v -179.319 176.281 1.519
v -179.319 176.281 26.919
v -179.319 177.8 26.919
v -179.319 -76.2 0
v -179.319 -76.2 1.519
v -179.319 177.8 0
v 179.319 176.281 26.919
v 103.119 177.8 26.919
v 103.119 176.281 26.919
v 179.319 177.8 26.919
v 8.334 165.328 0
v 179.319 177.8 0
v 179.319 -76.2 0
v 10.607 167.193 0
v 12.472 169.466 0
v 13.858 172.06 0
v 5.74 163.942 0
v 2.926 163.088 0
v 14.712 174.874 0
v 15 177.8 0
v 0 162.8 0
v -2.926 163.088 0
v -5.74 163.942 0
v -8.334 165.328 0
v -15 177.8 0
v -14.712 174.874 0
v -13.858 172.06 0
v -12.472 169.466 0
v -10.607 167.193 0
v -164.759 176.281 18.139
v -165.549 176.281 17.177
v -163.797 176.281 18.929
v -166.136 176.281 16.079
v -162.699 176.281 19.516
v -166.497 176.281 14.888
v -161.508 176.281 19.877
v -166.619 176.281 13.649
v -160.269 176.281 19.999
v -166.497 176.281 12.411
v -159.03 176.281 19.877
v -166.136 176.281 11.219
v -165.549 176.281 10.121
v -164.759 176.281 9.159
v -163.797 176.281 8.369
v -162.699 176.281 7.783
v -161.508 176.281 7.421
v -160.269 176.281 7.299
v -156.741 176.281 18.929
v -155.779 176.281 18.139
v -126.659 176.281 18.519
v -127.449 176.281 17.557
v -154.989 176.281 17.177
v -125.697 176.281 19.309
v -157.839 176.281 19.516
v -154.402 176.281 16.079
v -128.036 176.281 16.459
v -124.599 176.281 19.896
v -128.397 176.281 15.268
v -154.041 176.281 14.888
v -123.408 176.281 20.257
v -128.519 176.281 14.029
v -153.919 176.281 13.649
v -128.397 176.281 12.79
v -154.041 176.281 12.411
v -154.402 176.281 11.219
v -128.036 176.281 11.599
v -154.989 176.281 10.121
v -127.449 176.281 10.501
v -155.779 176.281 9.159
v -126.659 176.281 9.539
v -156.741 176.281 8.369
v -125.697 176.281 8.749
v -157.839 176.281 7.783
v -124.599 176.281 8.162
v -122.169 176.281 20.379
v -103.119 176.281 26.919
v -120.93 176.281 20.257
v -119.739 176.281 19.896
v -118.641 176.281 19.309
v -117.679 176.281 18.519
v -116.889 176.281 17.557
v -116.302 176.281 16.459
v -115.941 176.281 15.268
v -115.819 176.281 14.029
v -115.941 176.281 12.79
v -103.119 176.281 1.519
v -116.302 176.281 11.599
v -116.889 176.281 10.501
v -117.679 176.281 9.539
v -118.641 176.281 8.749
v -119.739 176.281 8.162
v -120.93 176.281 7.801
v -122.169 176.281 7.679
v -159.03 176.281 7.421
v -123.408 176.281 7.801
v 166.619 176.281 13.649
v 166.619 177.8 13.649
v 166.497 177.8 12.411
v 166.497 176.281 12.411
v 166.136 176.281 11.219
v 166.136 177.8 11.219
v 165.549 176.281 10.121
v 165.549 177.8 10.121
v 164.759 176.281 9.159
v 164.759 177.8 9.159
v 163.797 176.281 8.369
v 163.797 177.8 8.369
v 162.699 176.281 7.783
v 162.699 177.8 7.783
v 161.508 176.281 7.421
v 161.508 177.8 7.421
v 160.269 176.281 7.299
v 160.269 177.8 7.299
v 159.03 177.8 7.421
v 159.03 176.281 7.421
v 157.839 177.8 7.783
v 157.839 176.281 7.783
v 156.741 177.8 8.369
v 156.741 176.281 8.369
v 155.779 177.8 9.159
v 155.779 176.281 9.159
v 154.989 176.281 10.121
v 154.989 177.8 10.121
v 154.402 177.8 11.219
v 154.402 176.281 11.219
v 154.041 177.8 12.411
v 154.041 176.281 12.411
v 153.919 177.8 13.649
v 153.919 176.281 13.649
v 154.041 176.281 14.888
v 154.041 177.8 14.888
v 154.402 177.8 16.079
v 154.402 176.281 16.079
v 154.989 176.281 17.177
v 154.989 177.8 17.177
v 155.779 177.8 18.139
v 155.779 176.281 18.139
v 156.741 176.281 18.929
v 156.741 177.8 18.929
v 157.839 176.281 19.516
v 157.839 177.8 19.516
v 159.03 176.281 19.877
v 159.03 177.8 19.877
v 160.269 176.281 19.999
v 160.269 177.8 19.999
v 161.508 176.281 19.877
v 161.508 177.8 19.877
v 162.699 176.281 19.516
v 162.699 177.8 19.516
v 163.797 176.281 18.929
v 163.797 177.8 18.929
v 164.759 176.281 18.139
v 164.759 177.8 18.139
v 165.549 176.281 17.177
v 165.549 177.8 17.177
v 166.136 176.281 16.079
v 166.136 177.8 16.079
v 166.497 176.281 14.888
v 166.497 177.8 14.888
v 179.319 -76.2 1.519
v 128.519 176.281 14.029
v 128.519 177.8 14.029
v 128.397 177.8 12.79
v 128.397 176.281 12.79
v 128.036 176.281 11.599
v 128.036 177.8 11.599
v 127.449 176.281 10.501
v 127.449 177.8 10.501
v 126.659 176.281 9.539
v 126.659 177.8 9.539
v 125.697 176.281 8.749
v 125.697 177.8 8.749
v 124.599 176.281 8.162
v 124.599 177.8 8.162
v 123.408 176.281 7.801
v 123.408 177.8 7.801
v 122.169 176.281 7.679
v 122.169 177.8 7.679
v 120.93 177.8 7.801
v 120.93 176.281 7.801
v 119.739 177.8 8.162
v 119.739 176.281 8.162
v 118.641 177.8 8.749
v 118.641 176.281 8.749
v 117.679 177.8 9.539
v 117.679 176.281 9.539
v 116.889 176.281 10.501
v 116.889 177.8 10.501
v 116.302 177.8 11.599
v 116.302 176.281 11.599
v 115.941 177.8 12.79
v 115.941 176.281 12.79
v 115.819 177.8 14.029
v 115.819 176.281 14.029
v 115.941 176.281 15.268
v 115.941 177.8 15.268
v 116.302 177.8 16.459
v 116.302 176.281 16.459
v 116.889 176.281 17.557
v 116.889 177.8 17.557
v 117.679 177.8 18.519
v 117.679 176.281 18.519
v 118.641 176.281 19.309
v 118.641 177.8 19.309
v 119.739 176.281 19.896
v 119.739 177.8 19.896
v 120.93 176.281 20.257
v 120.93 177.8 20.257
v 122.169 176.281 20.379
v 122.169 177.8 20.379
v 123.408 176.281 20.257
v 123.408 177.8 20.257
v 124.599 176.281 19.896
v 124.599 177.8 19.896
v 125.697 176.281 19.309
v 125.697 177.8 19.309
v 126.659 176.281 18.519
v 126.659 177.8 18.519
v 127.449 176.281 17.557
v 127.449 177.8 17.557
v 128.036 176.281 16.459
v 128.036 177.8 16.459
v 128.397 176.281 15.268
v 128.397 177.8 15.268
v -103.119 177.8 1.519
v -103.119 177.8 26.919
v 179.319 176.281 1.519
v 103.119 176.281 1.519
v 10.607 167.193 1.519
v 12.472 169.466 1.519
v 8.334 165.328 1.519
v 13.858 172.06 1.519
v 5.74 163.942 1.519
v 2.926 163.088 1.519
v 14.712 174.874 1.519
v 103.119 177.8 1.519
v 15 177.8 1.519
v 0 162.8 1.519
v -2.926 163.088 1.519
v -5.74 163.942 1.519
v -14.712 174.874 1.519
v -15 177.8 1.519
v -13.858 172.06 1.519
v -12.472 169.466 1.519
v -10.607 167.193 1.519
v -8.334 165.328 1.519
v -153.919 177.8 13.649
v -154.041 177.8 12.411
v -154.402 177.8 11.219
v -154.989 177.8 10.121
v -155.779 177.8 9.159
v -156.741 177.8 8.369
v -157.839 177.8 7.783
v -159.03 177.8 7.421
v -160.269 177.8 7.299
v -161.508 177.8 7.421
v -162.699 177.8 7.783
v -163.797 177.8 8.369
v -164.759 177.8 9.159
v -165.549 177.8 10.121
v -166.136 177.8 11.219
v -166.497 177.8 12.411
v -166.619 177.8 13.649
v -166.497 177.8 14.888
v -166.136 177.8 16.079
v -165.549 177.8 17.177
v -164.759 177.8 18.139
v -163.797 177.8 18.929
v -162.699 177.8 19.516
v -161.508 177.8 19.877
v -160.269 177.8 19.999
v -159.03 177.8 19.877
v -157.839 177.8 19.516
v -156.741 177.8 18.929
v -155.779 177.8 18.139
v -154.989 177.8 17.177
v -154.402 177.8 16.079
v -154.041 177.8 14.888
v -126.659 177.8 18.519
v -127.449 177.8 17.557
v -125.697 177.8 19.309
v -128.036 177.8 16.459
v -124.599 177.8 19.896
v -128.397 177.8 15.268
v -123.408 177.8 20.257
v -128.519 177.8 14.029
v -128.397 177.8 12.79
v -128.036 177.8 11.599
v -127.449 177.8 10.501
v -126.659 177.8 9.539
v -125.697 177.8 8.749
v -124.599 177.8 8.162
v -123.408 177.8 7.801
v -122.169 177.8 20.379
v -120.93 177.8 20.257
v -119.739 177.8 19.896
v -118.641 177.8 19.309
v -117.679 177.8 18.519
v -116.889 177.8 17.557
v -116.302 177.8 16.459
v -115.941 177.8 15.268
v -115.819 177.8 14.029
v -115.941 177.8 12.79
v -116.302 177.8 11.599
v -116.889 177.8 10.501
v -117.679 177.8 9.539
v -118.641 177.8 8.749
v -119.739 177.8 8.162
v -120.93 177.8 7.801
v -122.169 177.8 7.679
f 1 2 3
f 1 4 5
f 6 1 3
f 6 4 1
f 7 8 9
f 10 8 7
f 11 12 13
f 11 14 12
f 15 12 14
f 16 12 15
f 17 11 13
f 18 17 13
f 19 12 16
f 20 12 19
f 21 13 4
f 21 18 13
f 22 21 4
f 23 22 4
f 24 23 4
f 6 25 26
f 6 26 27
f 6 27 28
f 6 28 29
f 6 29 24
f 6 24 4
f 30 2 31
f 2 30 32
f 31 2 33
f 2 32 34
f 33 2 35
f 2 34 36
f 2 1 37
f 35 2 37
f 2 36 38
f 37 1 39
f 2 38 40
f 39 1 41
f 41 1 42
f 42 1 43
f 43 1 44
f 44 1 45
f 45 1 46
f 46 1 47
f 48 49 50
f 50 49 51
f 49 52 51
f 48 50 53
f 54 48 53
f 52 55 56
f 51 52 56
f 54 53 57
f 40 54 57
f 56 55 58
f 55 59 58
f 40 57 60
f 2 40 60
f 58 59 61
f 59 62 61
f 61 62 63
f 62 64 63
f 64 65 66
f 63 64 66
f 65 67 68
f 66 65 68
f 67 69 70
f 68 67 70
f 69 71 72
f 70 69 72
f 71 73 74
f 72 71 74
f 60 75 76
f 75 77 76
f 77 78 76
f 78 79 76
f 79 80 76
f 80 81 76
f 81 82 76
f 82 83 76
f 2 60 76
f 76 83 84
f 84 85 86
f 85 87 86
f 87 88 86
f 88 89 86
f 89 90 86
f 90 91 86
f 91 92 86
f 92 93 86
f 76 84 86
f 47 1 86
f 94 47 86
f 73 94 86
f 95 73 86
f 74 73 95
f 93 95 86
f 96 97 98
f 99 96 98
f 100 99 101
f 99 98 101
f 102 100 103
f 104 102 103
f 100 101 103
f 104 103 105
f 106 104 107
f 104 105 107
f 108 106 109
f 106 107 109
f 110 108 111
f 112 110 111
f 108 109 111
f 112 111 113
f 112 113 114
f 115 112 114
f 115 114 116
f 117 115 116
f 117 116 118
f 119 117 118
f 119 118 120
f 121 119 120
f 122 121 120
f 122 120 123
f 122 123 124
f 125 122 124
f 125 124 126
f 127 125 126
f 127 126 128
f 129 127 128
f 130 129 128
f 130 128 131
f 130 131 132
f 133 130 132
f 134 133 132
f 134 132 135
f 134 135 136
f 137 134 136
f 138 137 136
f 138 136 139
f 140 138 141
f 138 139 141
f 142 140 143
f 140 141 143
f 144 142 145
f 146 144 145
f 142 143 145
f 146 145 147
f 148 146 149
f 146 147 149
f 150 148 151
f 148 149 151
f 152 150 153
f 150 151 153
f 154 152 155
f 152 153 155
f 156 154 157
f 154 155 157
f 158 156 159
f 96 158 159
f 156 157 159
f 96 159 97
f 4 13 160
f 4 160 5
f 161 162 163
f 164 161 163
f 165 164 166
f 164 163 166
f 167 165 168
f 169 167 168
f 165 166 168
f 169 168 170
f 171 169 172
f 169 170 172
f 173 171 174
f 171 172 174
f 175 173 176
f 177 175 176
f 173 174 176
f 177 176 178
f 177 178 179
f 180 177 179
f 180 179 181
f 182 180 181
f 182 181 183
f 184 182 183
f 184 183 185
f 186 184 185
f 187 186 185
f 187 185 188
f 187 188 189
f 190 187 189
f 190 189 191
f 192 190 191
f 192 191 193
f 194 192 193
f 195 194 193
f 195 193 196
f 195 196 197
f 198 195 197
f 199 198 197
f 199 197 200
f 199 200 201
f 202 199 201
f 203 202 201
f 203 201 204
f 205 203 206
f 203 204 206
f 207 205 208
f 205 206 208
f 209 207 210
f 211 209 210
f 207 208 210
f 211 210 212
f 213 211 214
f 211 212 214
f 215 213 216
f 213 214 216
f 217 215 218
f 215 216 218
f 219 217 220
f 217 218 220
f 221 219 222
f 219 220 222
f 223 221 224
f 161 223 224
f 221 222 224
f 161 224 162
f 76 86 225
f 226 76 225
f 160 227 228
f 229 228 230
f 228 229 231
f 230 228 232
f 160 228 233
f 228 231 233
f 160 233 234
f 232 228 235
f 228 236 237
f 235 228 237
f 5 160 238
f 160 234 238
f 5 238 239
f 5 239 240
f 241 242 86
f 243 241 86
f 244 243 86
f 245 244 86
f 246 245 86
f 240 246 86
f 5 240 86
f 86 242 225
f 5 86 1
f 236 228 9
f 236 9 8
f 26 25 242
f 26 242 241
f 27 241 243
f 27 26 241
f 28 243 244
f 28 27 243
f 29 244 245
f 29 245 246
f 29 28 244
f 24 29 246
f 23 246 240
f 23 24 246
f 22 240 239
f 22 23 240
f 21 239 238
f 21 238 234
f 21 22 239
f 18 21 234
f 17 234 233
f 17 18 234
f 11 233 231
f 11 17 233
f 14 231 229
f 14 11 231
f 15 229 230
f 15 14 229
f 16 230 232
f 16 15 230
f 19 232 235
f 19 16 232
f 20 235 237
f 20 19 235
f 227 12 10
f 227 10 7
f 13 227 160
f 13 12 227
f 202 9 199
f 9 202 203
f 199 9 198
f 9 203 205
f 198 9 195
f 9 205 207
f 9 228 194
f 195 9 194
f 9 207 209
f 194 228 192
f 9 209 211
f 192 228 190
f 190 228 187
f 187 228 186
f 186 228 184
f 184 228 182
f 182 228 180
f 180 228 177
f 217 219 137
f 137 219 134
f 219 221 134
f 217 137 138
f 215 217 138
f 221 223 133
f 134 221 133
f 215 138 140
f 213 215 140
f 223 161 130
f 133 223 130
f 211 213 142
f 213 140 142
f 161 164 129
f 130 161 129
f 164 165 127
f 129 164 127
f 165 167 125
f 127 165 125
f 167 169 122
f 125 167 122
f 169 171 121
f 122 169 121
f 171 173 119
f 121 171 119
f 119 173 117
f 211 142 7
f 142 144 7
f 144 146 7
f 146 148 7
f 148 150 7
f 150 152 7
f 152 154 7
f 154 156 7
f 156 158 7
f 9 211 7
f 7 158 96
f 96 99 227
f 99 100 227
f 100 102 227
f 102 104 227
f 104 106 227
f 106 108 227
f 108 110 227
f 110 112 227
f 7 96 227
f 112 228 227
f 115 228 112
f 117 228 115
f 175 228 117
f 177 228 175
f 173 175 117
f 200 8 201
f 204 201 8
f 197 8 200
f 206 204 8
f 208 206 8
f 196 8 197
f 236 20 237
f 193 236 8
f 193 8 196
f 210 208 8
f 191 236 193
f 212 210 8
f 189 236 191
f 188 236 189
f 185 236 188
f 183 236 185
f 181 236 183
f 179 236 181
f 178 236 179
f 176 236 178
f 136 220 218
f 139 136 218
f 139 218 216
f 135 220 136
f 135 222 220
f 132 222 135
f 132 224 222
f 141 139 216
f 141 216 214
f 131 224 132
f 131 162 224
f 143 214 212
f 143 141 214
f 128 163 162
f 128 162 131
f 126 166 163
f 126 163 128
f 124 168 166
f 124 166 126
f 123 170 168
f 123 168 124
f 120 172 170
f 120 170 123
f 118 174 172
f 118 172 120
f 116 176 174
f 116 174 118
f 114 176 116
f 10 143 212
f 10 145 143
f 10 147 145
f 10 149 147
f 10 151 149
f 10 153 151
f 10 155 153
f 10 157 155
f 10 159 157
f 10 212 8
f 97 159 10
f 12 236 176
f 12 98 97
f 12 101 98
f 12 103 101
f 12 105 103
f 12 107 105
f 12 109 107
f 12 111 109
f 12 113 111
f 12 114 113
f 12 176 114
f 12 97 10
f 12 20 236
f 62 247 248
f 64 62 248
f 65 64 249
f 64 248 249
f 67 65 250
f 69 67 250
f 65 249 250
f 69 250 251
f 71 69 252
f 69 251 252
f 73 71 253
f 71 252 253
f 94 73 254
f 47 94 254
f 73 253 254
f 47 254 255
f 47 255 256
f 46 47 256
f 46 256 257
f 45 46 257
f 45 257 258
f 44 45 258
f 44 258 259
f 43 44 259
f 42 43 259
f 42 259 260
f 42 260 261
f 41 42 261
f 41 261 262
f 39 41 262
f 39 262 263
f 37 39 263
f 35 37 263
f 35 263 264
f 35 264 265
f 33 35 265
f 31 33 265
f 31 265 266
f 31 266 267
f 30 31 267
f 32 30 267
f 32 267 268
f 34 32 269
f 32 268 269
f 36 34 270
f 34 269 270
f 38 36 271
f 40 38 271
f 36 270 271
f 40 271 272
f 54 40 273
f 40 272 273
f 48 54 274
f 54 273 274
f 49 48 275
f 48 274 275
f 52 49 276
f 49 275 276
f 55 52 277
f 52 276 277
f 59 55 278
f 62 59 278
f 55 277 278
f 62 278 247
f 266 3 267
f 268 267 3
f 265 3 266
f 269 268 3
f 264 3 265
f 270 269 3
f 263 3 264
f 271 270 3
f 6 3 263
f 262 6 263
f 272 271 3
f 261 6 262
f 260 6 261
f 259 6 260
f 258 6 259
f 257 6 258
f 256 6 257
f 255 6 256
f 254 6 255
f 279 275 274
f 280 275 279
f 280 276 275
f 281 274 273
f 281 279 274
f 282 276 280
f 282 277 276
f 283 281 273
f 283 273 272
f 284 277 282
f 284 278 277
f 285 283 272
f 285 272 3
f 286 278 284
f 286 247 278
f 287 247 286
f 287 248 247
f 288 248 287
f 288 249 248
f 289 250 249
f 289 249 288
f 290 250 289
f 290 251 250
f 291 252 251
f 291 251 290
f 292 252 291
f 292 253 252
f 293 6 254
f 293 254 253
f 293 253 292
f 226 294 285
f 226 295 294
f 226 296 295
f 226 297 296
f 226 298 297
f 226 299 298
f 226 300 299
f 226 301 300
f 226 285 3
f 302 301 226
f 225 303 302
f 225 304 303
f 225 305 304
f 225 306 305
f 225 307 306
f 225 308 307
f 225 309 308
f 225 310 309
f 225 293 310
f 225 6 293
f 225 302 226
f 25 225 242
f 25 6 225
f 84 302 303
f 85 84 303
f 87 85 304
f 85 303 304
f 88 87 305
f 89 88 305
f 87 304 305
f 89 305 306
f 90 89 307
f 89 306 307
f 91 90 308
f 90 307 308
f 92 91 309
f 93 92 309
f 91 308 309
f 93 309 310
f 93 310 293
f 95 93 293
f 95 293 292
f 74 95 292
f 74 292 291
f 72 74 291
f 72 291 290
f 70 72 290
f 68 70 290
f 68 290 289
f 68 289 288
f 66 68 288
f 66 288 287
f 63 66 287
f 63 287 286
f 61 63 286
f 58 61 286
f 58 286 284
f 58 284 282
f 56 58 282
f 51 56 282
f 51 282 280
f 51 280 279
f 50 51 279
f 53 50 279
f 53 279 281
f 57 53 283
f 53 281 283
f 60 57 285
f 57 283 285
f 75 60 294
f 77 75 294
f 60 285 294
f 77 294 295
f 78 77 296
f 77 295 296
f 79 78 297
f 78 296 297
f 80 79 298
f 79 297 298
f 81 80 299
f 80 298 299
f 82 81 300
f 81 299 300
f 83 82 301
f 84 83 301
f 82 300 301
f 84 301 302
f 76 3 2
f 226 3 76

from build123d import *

# Parameters (mm, degrees)
BOTTOM_CENTER_CASING_DEPTH = 1.51892
SKETCH3_W                  = 76.2
SKETCH3_H                  = 1.51892
BOSS_EXTRUDE1_DEPTH        = 25.4
SKETCH4_R                  = 6.35
CUT_EXTRUDE1_DEPTH         = 25.4


with BuildPart() as part:
    # Sketch1 → Bottom Center Casing (new body)
    with BuildSketch(Plane.XY):
        with BuildLine():
            Line((-179.31892, 177.8), (-15, 177.8))
            ThreePointArc((-15, 177.8), (0, 162.8), (15, 177.8))
            Line((15, 177.8), (179.31892, 177.8))
            Line((179.31892, 177.8), (179.31892, -76.2))
            Line((179.31892, -76.2), (-179.31892, -76.2))
            Line((-179.31892, -76.2), (-179.31892, 177.8))
        make_face()
    extrude(amount=BOTTOM_CENTER_CASING_DEPTH)

    # Sketch3 → Boss-Extrude1 (add)
    with BuildSketch(Plane.XY.offset(1.51892)):
        with Locations((-141.21892, 177.04054)):
            Rectangle(SKETCH3_W, SKETCH3_H)
        with Locations((141.21892, 177.04054)):
            Rectangle(SKETCH3_W, SKETCH3_H)
    extrude(amount=BOSS_EXTRUDE1_DEPTH)

    # Sketch4 → Cut-Extrude1 (cut)
    with BuildSketch(Plane(origin=(0, 177.8, 0), x_dir=(1, 0, 0), z_dir=(0, 1, 0))):
        with Locations((-160.26892, -13.649325)):
            Circle(SKETCH4_R)
        with Locations((-122.16892, -14.029055)):
            Circle(SKETCH4_R)
        with Locations((122.16892, -14.029055)):
            Circle(SKETCH4_R)
        with Locations((160.26892, -13.649325)):
            Circle(SKETCH4_R)
    extrude(amount=-CUT_EXTRUDE1_DEPTH, mode=Mode.SUBTRACT)


solid = part.part
